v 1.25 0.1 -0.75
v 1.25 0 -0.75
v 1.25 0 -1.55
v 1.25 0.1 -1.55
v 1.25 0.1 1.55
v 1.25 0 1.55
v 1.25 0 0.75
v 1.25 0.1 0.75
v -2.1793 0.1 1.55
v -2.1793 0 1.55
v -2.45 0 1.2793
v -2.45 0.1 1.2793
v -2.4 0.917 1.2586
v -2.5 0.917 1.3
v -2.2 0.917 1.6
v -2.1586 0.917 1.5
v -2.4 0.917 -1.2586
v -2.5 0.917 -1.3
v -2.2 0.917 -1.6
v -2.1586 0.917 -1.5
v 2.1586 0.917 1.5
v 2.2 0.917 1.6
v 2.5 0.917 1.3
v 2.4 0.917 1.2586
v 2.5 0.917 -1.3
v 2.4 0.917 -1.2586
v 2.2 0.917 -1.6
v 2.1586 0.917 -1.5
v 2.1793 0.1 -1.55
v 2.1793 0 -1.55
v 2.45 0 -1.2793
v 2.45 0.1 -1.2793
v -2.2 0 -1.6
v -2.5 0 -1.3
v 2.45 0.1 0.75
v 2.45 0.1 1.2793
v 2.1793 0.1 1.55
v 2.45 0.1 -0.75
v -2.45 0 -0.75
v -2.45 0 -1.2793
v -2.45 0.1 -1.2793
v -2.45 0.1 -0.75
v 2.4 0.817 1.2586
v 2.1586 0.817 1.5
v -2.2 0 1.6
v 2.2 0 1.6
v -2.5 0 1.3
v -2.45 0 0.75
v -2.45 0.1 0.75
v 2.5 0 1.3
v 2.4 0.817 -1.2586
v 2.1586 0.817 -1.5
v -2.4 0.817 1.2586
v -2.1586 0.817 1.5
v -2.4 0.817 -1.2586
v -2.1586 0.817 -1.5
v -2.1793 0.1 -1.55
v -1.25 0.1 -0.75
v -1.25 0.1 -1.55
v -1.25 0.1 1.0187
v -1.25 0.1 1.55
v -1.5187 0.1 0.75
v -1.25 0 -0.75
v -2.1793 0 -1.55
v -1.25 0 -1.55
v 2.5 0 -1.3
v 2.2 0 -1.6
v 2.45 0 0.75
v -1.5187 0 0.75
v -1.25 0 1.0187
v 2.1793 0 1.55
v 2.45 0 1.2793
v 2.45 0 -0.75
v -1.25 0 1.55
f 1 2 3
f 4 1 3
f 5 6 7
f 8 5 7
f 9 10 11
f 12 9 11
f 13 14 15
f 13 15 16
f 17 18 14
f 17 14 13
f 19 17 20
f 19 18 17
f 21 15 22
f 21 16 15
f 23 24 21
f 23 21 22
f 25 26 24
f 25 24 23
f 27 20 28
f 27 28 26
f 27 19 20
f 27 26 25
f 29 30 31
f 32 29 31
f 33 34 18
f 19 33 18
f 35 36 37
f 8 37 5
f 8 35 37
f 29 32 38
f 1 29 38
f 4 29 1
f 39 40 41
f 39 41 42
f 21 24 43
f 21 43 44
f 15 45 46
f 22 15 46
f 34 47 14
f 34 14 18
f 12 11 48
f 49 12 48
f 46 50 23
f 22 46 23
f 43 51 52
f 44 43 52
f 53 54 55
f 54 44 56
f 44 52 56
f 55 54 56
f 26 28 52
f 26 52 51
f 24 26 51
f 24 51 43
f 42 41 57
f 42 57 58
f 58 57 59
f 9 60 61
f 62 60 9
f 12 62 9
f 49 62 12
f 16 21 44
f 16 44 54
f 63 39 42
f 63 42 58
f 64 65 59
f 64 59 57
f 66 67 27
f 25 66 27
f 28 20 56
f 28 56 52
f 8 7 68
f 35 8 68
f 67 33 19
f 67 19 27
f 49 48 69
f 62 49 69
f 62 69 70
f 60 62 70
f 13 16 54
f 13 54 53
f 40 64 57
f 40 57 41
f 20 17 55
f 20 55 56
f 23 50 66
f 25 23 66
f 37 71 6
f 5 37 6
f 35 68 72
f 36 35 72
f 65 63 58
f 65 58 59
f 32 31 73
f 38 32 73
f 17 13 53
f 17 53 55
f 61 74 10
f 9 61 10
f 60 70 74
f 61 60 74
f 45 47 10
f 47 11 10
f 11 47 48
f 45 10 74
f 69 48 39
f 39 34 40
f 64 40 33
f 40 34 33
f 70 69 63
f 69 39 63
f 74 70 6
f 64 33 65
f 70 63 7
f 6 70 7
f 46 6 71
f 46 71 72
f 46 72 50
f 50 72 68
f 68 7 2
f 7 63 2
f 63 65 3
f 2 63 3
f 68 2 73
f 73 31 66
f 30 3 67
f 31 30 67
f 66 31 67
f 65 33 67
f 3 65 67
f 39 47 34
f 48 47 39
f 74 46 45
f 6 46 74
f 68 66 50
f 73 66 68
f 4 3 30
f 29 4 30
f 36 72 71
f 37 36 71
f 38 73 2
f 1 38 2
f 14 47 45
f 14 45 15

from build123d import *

# Parameters (mm, degrees)
ESBO_O1_W        = 5
ESBO_O1_H        = 3.2
EXTRUS_O1_DEPTH  = 0.917
CHANFRO3_SIZE    = 0.3
CHANFRO4_SIZE    = 0.3
CHANFRO5_SIZE    = 0.3
CHANFRO6_SIZE    = 0.3
EXTRUS_O6_DEPTH  = 0.1
EXTRUS_O8_DEPTH  = 0.1
EXTRUS_O9_DEPTH  = 0.1
EXTRUS_O13_DEPTH = 0.1
EXTRUS_O14_DEPTH = 0.1


with BuildPart() as part:
    # Esboço1 → Extrusão1 (new body)
    with BuildSketch(Plane(origin=(0, 0, 0), x_dir=(1, 0, 0), z_dir=(0, 1, 0))):
        Rectangle(ESBO_O1_W, ESBO_O1_H)
    extrude(amount=EXTRUS_O1_DEPTH)

    # Chanfro3
    chanfro3_edges = [part.edges().sort_by_distance(p)[0] for p in [
        (2.5, 0.4585, 1.6),
    ]]
    chamfer(chanfro3_edges, length=CHANFRO3_SIZE)

    # Chanfro4
    chanfro4_edges = [part.edges().sort_by_distance(p)[0] for p in [
        (-2.5, 0.4585, 1.6),
    ]]
    chamfer(chanfro4_edges, length=CHANFRO4_SIZE)

    # Chanfro5
    chanfro5_edges = [part.edges().sort_by_distance(p)[0] for p in [
        (2.5, 0.4585, -1.6),
    ]]
    chamfer(chanfro5_edges, length=CHANFRO5_SIZE)

    # Chanfro6
    chanfro6_edges = [part.edges().sort_by_distance(p)[0] for p in [
        (-2.5, 0.4585, -1.6),
    ]]
    chamfer(chanfro6_edges, length=CHANFRO6_SIZE)

    # Esboço4 → Extrusão6 (cut)
    with BuildSketch(Plane(origin=(0, 0, 0), x_dir=(1, 0, 0), z_dir=(0, 1, 0))):
        Polygon((1.25, 0.75), (1.25, 1.55), (2.179289322, 1.55), (2.45, 1.279289322), (2.45, 0.75), align=None)
    extrude(amount=EXTRUS_O6_DEPTH, mode=Mode.SUBTRACT)

    # Esboço6 → Extrusão8 (cut)
    with BuildSketch(Plane(origin=(0, 0, 0), x_dir=(1, 0, 0), z_dir=(0, 1, 0))):
        Polygon((1.25, -1.55), (1.25, -0.75), (2.45, -0.75), (2.45, -1.279289322), (2.179289322, -1.55), align=None)
    extrude(amount=EXTRUS_O8_DEPTH, mode=Mode.SUBTRACT)

    # Esboço7 → Extrusão9 (cut)
    with BuildSketch(Plane(origin=(0, 0, 0), x_dir=(1, 0, 0), z_dir=(0, 1, 0))):
        Polygon((-2.45, -0.75), (-1.518700577, -0.75), (-1.25, -1.018700577), (-1.25, -1.55), (-2.179289322, -1.55), (-2.45, -1.279289322), align=None)
    extrude(amount=EXTRUS_O9_DEPTH, mode=Mode.SUBTRACT)

    # Esboço10 → Extrusão13 (cut)
    with BuildSketch(Plane(origin=(0, 0.917, 0), x_dir=(1, 0, 0), z_dir=(0, 1, 0))):
        Polygon((-2.4, 1.258578644), (-2.158578644, 1.5), (2.158578644, 1.5), (2.4, 1.258578644), (2.4, -1.258578644), (2.158578644, -1.5), (-2.158578644, -1.5), (-2.4, -1.258578644), align=None)
    extrude(amount=-EXTRUS_O13_DEPTH, mode=Mode.SUBTRACT)

    # Esboço11 → Extrusão14 (cut)
    with BuildSketch(Plane(origin=(0, 0, 0), x_dir=(1, 0, 0), z_dir=(0, 1, 0))):
        Polygon((-2.45, 1.279289322), (-2.45, 0.75), (-1.25, 0.75), (-1.25, 1.55), (-2.179289322, 1.55), align=None)
    extrude(amount=EXTRUS_O14_DEPTH, mode=Mode.SUBTRACT)


solid = part.part
